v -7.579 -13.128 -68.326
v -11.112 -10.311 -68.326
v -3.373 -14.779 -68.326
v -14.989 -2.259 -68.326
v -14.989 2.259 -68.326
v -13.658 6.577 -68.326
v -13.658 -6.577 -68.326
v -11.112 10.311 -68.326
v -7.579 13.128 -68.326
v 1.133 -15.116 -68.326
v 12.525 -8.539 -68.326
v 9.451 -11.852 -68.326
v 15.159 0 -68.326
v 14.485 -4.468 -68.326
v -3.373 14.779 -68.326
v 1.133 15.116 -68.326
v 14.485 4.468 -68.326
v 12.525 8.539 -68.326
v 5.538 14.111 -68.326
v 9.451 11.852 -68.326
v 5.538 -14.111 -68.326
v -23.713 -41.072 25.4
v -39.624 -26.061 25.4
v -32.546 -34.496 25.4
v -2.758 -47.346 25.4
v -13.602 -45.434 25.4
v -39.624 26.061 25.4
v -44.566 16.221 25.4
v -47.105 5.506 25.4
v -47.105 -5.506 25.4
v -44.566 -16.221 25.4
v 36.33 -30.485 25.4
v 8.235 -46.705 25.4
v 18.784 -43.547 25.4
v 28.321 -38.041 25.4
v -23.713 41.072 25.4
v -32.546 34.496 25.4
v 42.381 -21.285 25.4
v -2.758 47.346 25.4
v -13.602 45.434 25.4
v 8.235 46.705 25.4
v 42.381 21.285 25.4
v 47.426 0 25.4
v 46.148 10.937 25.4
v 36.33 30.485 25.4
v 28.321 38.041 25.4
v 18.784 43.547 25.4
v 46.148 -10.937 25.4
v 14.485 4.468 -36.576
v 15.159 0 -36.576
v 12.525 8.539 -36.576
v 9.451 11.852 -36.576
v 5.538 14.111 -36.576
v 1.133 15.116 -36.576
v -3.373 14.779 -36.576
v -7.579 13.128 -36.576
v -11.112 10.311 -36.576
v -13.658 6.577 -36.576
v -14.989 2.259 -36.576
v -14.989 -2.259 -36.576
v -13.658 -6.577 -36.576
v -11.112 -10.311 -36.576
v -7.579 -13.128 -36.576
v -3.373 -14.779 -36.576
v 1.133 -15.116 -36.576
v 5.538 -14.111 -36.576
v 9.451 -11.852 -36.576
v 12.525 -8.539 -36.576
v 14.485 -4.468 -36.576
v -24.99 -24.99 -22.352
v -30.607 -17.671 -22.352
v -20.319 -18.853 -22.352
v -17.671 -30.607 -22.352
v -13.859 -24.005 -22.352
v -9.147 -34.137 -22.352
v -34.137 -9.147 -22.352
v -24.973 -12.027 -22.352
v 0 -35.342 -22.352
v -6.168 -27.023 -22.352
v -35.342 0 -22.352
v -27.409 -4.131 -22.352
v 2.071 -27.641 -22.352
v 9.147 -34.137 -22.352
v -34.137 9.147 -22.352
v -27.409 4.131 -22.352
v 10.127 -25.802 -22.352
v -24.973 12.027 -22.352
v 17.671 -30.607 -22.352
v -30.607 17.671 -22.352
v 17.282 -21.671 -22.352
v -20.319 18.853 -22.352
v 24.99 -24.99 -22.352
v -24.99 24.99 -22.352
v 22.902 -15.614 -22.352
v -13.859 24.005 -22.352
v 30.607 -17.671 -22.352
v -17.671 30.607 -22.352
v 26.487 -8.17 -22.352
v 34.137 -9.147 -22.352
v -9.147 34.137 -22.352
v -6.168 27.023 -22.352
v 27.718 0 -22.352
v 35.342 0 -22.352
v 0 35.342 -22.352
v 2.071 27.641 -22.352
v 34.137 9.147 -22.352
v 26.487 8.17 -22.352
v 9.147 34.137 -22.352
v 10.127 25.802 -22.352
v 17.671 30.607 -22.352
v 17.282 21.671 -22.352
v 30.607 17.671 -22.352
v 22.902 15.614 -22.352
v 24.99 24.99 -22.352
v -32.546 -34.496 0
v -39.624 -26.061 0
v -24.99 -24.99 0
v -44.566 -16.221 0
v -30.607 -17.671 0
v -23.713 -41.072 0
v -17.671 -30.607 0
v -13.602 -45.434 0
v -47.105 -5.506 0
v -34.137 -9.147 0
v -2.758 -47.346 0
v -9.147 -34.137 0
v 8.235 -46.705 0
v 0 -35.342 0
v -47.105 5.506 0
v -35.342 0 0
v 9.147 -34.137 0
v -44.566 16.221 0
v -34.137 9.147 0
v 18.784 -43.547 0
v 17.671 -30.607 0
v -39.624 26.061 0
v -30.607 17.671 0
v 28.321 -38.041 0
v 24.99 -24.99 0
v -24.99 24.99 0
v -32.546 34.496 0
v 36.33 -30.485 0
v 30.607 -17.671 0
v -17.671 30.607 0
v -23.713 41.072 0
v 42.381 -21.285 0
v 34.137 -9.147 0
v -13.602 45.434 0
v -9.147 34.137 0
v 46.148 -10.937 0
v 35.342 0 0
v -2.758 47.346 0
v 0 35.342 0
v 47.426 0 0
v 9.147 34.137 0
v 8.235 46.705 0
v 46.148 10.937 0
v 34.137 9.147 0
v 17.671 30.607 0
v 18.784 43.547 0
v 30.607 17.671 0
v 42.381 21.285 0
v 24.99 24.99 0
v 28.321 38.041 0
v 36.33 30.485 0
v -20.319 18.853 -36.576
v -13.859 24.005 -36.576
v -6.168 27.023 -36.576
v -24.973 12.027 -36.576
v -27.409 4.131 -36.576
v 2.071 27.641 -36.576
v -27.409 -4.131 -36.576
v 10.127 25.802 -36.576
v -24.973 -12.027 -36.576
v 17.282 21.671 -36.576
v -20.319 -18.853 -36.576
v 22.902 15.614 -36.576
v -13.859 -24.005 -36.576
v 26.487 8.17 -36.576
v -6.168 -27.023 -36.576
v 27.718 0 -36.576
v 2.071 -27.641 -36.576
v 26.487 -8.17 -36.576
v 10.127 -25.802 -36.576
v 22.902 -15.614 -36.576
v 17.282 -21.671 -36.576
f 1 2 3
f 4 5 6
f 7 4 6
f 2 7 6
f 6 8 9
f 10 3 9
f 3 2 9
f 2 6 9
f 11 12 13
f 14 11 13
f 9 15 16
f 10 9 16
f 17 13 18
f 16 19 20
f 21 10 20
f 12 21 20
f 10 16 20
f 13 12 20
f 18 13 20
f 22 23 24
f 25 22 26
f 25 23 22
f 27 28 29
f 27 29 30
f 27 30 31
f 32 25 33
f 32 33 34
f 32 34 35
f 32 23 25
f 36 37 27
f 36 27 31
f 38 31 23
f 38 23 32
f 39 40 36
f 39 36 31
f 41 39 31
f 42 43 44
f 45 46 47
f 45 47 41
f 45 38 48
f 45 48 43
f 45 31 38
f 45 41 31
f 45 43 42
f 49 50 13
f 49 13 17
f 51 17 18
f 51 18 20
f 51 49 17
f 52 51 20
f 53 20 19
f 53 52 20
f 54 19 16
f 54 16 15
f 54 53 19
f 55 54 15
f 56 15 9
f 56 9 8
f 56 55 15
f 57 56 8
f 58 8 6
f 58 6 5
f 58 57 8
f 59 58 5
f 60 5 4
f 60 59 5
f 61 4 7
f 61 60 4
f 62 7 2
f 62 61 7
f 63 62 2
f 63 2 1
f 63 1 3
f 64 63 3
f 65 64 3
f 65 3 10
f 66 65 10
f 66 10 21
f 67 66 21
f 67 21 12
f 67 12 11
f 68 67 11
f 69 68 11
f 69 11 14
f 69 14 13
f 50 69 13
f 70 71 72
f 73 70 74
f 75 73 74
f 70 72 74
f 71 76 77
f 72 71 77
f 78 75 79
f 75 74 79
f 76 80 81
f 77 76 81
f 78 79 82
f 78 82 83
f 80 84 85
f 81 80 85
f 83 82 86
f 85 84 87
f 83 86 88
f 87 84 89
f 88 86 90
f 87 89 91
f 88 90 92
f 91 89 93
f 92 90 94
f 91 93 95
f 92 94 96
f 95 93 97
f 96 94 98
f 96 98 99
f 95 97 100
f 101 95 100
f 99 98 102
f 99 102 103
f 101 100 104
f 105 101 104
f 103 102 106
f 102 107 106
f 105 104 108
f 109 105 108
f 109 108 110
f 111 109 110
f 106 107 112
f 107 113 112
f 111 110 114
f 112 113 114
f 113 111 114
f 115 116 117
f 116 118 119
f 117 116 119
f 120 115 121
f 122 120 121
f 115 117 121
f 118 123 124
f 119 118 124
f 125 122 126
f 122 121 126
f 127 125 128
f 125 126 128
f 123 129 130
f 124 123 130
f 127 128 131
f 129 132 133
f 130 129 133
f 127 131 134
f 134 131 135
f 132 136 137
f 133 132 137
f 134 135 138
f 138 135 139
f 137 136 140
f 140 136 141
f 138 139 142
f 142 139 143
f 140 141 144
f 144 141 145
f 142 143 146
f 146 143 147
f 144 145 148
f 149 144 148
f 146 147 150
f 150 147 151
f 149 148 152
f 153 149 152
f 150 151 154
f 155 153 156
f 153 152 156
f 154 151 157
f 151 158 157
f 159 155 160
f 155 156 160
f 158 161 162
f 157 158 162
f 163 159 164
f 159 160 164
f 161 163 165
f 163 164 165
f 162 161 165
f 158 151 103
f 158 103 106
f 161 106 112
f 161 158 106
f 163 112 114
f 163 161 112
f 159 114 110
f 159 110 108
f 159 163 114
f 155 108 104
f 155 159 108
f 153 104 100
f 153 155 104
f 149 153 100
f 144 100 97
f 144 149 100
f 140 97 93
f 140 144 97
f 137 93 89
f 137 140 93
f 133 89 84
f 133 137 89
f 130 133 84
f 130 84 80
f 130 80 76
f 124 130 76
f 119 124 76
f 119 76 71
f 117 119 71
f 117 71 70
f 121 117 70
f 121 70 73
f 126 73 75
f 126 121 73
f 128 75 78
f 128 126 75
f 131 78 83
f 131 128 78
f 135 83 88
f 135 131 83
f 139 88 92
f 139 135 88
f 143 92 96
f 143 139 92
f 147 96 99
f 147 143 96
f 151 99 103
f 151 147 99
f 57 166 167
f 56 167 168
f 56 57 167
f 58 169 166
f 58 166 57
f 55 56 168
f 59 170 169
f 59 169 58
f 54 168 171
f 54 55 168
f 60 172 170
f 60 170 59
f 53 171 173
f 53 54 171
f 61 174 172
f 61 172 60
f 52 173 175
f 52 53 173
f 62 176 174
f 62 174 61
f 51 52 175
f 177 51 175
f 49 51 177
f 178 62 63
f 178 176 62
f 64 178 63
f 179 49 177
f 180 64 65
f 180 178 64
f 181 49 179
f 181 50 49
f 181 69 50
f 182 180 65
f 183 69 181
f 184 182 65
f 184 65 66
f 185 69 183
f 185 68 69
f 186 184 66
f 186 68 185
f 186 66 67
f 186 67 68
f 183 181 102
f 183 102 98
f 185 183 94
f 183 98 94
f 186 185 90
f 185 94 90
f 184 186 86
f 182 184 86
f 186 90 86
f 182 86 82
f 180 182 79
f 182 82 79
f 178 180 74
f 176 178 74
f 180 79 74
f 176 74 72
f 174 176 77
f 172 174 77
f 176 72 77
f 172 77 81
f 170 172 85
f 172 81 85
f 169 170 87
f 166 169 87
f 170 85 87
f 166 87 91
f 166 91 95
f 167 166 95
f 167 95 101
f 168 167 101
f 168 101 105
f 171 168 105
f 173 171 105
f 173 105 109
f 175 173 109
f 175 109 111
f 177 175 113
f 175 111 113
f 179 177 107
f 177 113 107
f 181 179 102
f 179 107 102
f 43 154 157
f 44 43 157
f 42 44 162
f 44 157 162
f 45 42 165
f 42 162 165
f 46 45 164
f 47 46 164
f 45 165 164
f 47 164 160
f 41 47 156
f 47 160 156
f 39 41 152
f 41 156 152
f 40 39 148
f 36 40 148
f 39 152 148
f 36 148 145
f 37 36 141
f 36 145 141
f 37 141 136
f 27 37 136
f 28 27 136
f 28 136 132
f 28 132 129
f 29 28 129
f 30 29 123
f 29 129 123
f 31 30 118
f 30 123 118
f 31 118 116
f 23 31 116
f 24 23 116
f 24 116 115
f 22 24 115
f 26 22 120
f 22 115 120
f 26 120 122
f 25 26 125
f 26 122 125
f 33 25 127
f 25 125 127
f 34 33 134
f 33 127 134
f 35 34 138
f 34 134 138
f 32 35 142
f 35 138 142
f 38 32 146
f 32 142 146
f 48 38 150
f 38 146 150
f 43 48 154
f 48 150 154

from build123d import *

# Parameters (mm, degrees)
F0_R     = 47.425986
F1_DEPTH = 25.4
F2_R     = 35.341505
F3_DEPTH = 22.352
F4_R     = 27.718255
F5_DEPTH = 14.224
F6_R     = 15.158749
F7_DEPTH = 68.326


with BuildPart() as f1:
    # F0 (on Top) → F1 (new body)
    with BuildSketch(Plane.XY):
        Circle(F0_R)
    extrude(amount=F1_DEPTH)

    # F2 (on Top) → F3 (join)
    with BuildSketch(Plane.XY):
        Circle(F2_R)
    extrude(amount=-F3_DEPTH)

    # F4 (on face) → F5 (join)
    with BuildSketch(Plane(origin=(0, 0, -22.352), x_dir=(1, 0, 0), z_dir=(0, 0, -1))):
        Circle(F4_R)
    extrude(amount=F5_DEPTH)

    # F6 (on Top) → F7 (join)
    with BuildSketch(Plane.XY):
        Circle(F6_R)
    extrude(amount=-F7_DEPTH)


solid = f1.part
